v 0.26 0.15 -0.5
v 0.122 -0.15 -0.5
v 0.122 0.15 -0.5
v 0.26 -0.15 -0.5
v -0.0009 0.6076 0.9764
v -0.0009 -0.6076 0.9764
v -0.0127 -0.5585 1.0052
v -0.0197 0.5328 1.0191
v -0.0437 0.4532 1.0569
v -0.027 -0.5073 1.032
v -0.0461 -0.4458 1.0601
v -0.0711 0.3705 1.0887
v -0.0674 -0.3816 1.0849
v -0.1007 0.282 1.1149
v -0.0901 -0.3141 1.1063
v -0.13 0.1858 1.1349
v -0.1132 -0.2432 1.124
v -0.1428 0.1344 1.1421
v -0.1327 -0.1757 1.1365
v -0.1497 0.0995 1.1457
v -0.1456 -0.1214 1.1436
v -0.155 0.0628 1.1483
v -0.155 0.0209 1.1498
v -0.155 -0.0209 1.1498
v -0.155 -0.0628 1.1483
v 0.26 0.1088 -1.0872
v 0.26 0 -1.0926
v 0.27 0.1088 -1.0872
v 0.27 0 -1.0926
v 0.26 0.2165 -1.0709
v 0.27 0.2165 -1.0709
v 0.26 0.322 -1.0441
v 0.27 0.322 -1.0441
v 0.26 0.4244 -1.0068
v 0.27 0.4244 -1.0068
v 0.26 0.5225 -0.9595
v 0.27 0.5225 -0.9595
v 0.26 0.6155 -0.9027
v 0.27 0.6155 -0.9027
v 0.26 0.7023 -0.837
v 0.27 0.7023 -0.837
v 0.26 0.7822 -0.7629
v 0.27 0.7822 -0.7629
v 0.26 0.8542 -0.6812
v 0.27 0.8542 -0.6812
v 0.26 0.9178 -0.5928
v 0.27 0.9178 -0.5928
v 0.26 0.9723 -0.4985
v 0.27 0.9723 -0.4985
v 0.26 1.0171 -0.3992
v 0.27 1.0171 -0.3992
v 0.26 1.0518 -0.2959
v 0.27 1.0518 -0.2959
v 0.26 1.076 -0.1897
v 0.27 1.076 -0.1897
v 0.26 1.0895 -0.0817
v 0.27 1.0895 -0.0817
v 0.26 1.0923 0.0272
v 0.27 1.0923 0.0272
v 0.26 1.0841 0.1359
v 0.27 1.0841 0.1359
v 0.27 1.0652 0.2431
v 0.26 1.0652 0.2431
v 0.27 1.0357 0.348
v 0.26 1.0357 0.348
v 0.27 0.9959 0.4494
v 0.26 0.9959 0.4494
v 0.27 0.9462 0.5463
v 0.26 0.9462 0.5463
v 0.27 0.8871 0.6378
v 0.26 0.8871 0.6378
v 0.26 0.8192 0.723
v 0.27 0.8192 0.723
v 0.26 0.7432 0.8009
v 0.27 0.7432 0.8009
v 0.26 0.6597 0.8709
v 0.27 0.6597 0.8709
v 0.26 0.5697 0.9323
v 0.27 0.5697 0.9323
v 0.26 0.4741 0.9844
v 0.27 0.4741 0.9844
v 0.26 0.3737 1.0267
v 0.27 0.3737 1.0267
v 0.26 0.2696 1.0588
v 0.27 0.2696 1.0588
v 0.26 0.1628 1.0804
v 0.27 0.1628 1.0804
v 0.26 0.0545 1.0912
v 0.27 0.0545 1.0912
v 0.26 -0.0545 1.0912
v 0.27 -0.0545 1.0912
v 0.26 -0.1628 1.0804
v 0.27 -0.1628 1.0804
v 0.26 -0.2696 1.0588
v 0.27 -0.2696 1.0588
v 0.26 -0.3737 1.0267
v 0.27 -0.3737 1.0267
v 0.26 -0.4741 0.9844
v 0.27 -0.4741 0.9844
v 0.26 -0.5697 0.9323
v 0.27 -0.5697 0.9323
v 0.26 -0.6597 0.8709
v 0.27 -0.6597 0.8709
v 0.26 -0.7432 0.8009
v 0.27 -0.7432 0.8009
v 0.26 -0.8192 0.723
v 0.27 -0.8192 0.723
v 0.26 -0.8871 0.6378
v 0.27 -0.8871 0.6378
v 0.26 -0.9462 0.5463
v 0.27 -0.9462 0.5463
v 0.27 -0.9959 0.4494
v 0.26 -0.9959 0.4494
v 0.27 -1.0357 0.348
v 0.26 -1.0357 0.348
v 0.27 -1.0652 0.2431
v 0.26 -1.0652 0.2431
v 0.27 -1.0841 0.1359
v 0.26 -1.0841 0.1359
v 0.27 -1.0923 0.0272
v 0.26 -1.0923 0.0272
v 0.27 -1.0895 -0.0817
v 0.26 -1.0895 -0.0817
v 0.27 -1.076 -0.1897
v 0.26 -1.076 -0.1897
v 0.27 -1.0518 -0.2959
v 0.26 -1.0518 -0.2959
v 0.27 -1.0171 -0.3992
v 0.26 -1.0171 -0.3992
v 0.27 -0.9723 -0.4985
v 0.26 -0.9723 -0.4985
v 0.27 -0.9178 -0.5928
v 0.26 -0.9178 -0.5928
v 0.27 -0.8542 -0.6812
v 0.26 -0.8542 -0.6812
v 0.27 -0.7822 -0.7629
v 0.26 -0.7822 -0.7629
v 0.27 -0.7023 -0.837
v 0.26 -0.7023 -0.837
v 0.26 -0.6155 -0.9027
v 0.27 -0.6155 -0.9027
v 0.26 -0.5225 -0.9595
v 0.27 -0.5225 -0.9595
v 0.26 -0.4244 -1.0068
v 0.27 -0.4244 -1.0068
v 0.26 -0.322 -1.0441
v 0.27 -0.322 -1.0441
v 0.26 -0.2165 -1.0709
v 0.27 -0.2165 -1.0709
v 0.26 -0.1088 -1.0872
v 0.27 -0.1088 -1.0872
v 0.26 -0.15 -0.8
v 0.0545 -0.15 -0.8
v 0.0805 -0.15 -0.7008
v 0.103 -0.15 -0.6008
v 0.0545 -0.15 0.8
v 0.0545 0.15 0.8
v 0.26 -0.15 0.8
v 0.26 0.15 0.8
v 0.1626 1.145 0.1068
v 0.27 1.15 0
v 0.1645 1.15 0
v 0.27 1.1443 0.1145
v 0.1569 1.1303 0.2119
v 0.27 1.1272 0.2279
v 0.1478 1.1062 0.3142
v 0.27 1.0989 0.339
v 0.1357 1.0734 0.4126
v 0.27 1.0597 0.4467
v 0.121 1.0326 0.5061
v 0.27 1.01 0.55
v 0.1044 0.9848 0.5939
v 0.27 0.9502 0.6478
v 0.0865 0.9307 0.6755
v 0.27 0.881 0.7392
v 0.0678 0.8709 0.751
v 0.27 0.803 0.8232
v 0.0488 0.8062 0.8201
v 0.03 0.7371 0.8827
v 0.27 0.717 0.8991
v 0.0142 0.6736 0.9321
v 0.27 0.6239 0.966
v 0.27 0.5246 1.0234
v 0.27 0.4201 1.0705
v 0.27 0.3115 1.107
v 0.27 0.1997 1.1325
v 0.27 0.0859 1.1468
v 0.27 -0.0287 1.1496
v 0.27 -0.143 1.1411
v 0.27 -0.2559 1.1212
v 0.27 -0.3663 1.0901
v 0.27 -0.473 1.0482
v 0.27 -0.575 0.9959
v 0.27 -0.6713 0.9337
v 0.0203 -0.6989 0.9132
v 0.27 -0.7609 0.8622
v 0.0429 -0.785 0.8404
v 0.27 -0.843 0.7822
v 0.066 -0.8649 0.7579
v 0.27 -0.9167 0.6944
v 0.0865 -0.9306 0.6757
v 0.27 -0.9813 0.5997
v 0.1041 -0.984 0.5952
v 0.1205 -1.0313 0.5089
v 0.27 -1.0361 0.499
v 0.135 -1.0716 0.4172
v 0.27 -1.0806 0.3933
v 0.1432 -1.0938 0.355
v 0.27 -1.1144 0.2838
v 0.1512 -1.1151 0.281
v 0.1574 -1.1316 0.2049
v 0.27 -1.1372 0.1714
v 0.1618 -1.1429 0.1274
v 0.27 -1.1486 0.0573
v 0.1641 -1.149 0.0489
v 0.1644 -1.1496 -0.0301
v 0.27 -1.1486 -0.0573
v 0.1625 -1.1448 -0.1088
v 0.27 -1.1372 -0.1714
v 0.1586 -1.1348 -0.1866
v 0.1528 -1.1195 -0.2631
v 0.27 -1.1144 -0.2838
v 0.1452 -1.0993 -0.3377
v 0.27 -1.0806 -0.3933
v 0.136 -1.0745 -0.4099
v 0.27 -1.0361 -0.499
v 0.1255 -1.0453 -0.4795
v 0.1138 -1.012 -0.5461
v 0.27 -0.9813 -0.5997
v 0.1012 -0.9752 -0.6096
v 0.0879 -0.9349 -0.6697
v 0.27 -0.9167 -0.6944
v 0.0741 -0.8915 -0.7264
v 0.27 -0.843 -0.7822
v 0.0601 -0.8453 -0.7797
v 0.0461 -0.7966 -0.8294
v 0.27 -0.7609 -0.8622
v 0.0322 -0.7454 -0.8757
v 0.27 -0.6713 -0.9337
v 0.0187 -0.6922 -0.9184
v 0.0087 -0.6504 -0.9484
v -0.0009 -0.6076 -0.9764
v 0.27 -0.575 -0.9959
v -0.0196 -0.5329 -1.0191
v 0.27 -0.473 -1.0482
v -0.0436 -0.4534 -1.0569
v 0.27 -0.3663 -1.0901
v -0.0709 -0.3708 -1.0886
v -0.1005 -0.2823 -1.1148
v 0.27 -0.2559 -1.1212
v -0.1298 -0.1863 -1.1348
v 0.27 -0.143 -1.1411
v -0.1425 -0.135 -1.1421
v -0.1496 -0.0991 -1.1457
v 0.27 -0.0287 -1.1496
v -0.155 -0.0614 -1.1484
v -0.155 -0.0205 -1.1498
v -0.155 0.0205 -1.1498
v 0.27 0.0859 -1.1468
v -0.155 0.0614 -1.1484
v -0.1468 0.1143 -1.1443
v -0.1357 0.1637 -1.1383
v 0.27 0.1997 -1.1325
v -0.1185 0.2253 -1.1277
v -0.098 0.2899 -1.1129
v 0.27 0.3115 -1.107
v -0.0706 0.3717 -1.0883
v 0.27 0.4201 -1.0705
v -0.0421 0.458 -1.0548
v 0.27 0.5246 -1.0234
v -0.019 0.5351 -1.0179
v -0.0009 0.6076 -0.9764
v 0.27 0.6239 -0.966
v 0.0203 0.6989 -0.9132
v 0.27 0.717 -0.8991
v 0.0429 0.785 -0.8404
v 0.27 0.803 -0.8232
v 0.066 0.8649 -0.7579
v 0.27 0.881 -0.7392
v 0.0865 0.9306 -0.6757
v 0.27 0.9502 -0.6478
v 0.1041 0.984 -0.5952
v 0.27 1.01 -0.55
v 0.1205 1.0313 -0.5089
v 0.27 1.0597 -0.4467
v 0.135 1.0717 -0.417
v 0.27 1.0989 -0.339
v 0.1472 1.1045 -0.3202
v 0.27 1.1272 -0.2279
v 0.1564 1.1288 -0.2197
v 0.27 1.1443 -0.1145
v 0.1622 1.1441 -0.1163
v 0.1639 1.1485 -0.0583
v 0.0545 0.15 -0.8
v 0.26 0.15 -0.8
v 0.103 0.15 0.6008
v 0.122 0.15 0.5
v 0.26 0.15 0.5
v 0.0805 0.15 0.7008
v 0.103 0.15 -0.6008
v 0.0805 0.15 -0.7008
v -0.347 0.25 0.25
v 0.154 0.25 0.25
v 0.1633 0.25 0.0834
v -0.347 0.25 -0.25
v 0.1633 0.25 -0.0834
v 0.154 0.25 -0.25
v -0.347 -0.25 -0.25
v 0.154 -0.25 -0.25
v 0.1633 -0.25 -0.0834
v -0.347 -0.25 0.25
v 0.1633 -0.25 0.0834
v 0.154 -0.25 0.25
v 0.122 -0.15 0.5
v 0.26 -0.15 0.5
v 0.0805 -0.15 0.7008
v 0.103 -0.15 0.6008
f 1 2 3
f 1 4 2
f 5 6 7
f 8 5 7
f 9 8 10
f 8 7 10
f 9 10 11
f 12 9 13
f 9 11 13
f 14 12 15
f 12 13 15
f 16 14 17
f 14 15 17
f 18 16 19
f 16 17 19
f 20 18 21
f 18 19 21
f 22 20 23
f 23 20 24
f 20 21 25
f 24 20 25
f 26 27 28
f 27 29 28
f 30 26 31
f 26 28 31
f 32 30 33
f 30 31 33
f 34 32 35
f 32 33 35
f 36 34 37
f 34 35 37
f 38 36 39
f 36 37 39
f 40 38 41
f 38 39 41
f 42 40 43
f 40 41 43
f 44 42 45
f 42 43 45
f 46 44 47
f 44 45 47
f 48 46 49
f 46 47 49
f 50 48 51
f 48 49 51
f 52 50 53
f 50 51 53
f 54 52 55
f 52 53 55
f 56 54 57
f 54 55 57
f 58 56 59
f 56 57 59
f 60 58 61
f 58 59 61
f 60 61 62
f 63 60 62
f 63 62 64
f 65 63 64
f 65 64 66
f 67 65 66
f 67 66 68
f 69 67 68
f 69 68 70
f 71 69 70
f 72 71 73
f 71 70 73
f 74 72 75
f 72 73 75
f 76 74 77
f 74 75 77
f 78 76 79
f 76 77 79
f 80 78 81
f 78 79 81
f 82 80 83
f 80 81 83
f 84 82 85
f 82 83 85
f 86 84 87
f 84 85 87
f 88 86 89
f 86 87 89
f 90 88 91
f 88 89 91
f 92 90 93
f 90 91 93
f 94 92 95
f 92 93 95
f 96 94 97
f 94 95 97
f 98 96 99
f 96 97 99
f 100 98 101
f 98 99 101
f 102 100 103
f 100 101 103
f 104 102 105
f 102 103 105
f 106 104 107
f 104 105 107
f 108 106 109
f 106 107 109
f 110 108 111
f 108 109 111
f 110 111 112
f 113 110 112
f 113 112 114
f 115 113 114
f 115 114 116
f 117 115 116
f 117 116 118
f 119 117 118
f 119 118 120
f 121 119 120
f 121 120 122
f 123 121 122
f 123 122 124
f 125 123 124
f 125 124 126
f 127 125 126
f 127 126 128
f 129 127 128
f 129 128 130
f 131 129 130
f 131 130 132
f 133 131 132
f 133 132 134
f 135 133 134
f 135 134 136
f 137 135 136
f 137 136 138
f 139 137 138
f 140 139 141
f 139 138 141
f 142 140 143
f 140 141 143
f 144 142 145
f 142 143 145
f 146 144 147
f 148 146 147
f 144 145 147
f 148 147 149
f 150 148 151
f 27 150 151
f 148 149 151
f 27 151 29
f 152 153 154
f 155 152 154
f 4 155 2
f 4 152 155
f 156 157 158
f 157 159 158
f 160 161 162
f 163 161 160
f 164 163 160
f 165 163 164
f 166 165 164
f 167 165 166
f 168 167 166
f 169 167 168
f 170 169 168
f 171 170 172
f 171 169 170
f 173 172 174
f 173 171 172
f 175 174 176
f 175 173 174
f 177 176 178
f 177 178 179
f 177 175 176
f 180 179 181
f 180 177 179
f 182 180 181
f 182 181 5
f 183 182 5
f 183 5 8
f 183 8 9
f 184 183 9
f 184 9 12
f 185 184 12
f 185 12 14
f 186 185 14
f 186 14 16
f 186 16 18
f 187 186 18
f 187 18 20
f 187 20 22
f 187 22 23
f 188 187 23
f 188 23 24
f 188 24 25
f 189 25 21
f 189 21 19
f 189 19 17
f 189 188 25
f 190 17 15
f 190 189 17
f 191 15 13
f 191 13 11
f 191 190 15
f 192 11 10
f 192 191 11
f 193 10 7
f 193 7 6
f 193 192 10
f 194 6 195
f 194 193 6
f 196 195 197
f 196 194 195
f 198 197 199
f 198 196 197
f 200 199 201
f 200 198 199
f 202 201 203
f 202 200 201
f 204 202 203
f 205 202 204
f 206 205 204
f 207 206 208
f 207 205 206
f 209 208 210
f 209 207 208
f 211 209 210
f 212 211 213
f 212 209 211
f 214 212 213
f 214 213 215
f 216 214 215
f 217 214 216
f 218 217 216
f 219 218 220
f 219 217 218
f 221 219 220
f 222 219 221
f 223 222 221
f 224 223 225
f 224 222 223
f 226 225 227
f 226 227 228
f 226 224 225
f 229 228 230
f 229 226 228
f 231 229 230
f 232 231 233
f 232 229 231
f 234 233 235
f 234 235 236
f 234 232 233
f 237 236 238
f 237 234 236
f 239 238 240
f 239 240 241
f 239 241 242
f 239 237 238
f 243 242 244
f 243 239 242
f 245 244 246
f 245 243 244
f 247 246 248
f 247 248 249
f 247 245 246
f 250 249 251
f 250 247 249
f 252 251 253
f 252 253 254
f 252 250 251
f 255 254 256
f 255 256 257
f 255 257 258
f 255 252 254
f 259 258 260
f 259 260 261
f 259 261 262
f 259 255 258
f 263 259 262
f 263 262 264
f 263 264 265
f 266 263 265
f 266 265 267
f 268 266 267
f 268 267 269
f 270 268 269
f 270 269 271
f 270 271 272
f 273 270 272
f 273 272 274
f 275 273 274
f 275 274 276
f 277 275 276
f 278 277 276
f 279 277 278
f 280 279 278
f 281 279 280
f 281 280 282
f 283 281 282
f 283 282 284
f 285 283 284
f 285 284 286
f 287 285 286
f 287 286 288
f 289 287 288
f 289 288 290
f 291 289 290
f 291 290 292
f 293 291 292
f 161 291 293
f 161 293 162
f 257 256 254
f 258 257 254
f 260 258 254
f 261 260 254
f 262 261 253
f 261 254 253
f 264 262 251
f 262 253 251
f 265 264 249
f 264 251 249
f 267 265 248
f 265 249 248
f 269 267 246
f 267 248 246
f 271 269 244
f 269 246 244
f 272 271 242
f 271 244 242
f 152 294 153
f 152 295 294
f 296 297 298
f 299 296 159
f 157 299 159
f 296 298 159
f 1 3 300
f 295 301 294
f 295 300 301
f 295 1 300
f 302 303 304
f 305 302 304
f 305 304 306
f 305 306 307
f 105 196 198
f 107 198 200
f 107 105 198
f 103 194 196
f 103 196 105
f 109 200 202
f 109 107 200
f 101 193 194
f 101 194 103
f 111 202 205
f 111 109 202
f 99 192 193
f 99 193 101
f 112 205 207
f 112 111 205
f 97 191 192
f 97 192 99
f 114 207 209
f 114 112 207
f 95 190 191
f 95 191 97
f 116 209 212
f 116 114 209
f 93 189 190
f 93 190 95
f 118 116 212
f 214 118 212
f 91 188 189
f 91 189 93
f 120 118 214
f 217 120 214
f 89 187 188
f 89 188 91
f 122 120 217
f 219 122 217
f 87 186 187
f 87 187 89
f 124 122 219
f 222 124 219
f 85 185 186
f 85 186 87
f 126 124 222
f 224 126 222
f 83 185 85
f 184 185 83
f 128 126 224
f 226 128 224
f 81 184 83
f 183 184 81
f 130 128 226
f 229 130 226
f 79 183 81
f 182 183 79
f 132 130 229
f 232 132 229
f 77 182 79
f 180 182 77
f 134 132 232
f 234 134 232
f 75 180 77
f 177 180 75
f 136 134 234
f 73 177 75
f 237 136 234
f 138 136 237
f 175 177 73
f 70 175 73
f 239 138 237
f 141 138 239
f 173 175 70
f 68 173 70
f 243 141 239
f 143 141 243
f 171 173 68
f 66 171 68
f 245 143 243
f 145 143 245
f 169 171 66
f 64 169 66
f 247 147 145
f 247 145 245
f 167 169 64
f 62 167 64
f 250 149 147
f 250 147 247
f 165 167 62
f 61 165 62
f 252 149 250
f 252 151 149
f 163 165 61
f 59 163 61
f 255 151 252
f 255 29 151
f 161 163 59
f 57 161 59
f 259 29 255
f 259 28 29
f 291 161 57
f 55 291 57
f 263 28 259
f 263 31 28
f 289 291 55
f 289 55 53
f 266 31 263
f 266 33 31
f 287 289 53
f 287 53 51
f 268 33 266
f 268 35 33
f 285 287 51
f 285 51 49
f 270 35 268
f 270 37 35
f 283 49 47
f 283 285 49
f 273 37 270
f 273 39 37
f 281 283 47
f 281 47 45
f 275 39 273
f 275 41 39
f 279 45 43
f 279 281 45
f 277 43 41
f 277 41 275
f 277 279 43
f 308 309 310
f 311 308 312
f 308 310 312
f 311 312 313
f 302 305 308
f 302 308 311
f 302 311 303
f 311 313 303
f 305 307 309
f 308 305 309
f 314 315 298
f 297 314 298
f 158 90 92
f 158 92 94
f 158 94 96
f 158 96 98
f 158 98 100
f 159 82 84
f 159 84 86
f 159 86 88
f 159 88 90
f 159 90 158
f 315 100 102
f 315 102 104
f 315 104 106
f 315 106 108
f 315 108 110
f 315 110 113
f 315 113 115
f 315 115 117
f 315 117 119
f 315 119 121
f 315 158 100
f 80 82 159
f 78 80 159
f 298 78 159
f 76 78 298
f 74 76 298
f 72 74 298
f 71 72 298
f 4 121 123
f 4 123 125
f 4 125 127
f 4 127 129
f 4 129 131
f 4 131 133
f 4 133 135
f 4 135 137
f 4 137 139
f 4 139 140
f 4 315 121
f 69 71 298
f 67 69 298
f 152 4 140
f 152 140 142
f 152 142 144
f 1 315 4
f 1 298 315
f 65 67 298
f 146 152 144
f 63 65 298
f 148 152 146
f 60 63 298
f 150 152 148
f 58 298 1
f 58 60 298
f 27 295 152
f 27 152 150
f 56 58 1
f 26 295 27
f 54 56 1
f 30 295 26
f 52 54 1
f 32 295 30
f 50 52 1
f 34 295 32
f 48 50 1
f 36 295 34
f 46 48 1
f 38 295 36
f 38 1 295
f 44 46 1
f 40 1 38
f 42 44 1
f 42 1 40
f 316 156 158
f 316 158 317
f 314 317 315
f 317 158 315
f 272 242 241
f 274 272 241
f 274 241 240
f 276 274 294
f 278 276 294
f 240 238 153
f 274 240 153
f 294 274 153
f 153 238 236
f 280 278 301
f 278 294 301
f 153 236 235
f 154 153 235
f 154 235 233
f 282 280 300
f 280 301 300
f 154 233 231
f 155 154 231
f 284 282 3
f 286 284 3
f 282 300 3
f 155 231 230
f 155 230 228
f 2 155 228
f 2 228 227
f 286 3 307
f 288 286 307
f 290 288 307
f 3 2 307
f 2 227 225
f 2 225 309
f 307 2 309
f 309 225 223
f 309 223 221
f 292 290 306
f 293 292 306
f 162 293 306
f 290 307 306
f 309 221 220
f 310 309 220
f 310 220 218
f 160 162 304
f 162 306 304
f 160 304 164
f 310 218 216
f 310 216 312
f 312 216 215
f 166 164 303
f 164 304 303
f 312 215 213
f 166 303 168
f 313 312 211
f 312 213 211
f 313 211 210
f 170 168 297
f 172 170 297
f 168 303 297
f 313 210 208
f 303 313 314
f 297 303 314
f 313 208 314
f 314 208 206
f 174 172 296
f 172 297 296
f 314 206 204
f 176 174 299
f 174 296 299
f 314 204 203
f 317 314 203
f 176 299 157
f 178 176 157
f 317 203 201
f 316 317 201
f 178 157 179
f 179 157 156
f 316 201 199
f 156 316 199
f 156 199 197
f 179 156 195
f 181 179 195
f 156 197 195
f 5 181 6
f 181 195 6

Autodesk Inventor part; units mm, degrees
ref_plane "YZ Plane" through (0, 0, 0) normal (1, 0, 0) x (0, 1, 0)
ref_plane "XZ Plane" through (0, 0, 0) normal (0, 1, 0) x (-1, 0, 0)
ref_plane "XY Plane" through (0, 0, 0) normal (0, 0, 1) x (1, 0, 0)
sketch "Boceto4" plane through (0, 0, 0) normal (1, 0, 0) x (0, 1, 0)
  circle A0 centre (0, 0) radius 1.15
  circle A1 centre (0, 0) radius 1.0926
extrude "Extrusión3" add sketch "Boceto4" along normal blind 0.27 and the other way blind 0.155 contours A0 | A1
sketch "Boceto5" plane through (0, 0, 0) normal (0, 1, 0) x (-1, 0, 0)
  line L0 (-0.27, 1.15) -> (-0.27, -1.15) projected
  line L1 (0.155, -1.15) -> (0.155, 1.15) projected
  line L2 (0.155, -1.15) -> (0.155, 1.15) projected
  line L3 (0.155, -1.15) -> (-0.27, -1.15) projected
  line L4 (0.155, 1.15) -> (-0.27, 1.15) projected
  arc A0 (0.0009, 0.9764) -> (0.0009, -0.9764) centre (2.8, 0) ccw
  arc A1 (0.0009, -0.9764) -> (0.2382, -1.174) centre (0.2842, -0.8776) ccw
  arc A2 (0.2382, 1.174) -> (0.0009, 0.9764) centre (0.2842, 0.8776) ccw
  line L5 (0.2382, -1.174) -> (0.2382, 1.174)
  point P0 (0, 0)
extrude "Extrusión4" cut sketch "Boceto5" along normal mid plane 27 contours A2 L5 A1 L1 | L1 A1 A0 A2
sketch "Boceto6" plane through (0.27, 0, 0) normal (1, 0, 0) x (0, 0, -1)
  line L0 (0, 0) -> (0, 0.25)
  line L1 (0, 0.25) -> (0.25, 0.25)
  line L2 (0.25, 0.25) -> (0.25, -0.25)
  line L3 (0.25, -0.25) -> (-0.25, -0.25)
  line L4 (-0.25, -0.25) -> (-0.25, 0.25)
  line L5 (-0.25, 0.25) -> (0.25, 0.25)
  dimension "d10" = 0.25
  dimension "d11" = 0.25
  dimension "d12" = 0.5
  dimension "d13" = 0.5
  dimension "d14" = 0.5
extrude "Extrusión5" add sketch "Boceto6" against normal blind 0.117
sketch "Boceto7" plane through (0.153, 0, 0) normal (-1, 0, 0) x (0, 0, 1)
  line L0 (-0.25, 0.25) -> (-0.25, -0.25) projected
  line L1 (-0.25, -0.25) -> (0.25, -0.25) projected
  line L2 (0.25, -0.25) -> (0.25, 0.25) projected
  line L3 (0.25, 0.25) -> (-0.25, 0.25) projected
  point P0 (0, 0)
extrude "Extrusión6" add sketch "Boceto7" along normal blind 0.5
sketch "Boceto8" plane through (0.27, 0, 0) normal (1, 0, 0) x (0, 0, -1)
  circle A0 centre (0, 0) radius 1.15
  circle A1 centre (0, 0) radius 1.0926
extrude "Extrusión7" cut sketch "Boceto8" against normal blind 0.01 contours A1
sketch "Boceto9" plane through (0.26, 0, 0) normal (1, 0, 0) x (0, 0, -1)
  line L0 (0.5, 0) -> (0.5, 0.15)
  line L1 (0.5, 0.15) -> (0.8, 0.15)
  line L2 (0.8, 0.15) -> (0.8, -0.15)
  line L3 (0.8, -0.15) -> (0.5, -0.15)
  line L4 (0.5, -0.15) -> (0.5, 0.15)
  line L5 (-0.5, 0) -> (-0.5, 0.15)
  line L6 (-0.5, 0.15) -> (-0.8, 0.15)
  line L7 (-0.8, 0.15) -> (-0.8, -0.15)
  line L8 (-0.8, -0.15) -> (-0.5, -0.15)
  line L9 (-0.5, -0.15) -> (-0.5, 0.15)
  point P0 (0, 0)
  dimension "d21" = 0.5
  dimension "d22" = 0.15
  dimension "d23" = 0.3
  dimension "d24" = 0.3
  dimension "d25" = 0.3
extrude "Extrusión8" cut sketch "Boceto9" against normal blind 0.3
properties part number "ET15"
